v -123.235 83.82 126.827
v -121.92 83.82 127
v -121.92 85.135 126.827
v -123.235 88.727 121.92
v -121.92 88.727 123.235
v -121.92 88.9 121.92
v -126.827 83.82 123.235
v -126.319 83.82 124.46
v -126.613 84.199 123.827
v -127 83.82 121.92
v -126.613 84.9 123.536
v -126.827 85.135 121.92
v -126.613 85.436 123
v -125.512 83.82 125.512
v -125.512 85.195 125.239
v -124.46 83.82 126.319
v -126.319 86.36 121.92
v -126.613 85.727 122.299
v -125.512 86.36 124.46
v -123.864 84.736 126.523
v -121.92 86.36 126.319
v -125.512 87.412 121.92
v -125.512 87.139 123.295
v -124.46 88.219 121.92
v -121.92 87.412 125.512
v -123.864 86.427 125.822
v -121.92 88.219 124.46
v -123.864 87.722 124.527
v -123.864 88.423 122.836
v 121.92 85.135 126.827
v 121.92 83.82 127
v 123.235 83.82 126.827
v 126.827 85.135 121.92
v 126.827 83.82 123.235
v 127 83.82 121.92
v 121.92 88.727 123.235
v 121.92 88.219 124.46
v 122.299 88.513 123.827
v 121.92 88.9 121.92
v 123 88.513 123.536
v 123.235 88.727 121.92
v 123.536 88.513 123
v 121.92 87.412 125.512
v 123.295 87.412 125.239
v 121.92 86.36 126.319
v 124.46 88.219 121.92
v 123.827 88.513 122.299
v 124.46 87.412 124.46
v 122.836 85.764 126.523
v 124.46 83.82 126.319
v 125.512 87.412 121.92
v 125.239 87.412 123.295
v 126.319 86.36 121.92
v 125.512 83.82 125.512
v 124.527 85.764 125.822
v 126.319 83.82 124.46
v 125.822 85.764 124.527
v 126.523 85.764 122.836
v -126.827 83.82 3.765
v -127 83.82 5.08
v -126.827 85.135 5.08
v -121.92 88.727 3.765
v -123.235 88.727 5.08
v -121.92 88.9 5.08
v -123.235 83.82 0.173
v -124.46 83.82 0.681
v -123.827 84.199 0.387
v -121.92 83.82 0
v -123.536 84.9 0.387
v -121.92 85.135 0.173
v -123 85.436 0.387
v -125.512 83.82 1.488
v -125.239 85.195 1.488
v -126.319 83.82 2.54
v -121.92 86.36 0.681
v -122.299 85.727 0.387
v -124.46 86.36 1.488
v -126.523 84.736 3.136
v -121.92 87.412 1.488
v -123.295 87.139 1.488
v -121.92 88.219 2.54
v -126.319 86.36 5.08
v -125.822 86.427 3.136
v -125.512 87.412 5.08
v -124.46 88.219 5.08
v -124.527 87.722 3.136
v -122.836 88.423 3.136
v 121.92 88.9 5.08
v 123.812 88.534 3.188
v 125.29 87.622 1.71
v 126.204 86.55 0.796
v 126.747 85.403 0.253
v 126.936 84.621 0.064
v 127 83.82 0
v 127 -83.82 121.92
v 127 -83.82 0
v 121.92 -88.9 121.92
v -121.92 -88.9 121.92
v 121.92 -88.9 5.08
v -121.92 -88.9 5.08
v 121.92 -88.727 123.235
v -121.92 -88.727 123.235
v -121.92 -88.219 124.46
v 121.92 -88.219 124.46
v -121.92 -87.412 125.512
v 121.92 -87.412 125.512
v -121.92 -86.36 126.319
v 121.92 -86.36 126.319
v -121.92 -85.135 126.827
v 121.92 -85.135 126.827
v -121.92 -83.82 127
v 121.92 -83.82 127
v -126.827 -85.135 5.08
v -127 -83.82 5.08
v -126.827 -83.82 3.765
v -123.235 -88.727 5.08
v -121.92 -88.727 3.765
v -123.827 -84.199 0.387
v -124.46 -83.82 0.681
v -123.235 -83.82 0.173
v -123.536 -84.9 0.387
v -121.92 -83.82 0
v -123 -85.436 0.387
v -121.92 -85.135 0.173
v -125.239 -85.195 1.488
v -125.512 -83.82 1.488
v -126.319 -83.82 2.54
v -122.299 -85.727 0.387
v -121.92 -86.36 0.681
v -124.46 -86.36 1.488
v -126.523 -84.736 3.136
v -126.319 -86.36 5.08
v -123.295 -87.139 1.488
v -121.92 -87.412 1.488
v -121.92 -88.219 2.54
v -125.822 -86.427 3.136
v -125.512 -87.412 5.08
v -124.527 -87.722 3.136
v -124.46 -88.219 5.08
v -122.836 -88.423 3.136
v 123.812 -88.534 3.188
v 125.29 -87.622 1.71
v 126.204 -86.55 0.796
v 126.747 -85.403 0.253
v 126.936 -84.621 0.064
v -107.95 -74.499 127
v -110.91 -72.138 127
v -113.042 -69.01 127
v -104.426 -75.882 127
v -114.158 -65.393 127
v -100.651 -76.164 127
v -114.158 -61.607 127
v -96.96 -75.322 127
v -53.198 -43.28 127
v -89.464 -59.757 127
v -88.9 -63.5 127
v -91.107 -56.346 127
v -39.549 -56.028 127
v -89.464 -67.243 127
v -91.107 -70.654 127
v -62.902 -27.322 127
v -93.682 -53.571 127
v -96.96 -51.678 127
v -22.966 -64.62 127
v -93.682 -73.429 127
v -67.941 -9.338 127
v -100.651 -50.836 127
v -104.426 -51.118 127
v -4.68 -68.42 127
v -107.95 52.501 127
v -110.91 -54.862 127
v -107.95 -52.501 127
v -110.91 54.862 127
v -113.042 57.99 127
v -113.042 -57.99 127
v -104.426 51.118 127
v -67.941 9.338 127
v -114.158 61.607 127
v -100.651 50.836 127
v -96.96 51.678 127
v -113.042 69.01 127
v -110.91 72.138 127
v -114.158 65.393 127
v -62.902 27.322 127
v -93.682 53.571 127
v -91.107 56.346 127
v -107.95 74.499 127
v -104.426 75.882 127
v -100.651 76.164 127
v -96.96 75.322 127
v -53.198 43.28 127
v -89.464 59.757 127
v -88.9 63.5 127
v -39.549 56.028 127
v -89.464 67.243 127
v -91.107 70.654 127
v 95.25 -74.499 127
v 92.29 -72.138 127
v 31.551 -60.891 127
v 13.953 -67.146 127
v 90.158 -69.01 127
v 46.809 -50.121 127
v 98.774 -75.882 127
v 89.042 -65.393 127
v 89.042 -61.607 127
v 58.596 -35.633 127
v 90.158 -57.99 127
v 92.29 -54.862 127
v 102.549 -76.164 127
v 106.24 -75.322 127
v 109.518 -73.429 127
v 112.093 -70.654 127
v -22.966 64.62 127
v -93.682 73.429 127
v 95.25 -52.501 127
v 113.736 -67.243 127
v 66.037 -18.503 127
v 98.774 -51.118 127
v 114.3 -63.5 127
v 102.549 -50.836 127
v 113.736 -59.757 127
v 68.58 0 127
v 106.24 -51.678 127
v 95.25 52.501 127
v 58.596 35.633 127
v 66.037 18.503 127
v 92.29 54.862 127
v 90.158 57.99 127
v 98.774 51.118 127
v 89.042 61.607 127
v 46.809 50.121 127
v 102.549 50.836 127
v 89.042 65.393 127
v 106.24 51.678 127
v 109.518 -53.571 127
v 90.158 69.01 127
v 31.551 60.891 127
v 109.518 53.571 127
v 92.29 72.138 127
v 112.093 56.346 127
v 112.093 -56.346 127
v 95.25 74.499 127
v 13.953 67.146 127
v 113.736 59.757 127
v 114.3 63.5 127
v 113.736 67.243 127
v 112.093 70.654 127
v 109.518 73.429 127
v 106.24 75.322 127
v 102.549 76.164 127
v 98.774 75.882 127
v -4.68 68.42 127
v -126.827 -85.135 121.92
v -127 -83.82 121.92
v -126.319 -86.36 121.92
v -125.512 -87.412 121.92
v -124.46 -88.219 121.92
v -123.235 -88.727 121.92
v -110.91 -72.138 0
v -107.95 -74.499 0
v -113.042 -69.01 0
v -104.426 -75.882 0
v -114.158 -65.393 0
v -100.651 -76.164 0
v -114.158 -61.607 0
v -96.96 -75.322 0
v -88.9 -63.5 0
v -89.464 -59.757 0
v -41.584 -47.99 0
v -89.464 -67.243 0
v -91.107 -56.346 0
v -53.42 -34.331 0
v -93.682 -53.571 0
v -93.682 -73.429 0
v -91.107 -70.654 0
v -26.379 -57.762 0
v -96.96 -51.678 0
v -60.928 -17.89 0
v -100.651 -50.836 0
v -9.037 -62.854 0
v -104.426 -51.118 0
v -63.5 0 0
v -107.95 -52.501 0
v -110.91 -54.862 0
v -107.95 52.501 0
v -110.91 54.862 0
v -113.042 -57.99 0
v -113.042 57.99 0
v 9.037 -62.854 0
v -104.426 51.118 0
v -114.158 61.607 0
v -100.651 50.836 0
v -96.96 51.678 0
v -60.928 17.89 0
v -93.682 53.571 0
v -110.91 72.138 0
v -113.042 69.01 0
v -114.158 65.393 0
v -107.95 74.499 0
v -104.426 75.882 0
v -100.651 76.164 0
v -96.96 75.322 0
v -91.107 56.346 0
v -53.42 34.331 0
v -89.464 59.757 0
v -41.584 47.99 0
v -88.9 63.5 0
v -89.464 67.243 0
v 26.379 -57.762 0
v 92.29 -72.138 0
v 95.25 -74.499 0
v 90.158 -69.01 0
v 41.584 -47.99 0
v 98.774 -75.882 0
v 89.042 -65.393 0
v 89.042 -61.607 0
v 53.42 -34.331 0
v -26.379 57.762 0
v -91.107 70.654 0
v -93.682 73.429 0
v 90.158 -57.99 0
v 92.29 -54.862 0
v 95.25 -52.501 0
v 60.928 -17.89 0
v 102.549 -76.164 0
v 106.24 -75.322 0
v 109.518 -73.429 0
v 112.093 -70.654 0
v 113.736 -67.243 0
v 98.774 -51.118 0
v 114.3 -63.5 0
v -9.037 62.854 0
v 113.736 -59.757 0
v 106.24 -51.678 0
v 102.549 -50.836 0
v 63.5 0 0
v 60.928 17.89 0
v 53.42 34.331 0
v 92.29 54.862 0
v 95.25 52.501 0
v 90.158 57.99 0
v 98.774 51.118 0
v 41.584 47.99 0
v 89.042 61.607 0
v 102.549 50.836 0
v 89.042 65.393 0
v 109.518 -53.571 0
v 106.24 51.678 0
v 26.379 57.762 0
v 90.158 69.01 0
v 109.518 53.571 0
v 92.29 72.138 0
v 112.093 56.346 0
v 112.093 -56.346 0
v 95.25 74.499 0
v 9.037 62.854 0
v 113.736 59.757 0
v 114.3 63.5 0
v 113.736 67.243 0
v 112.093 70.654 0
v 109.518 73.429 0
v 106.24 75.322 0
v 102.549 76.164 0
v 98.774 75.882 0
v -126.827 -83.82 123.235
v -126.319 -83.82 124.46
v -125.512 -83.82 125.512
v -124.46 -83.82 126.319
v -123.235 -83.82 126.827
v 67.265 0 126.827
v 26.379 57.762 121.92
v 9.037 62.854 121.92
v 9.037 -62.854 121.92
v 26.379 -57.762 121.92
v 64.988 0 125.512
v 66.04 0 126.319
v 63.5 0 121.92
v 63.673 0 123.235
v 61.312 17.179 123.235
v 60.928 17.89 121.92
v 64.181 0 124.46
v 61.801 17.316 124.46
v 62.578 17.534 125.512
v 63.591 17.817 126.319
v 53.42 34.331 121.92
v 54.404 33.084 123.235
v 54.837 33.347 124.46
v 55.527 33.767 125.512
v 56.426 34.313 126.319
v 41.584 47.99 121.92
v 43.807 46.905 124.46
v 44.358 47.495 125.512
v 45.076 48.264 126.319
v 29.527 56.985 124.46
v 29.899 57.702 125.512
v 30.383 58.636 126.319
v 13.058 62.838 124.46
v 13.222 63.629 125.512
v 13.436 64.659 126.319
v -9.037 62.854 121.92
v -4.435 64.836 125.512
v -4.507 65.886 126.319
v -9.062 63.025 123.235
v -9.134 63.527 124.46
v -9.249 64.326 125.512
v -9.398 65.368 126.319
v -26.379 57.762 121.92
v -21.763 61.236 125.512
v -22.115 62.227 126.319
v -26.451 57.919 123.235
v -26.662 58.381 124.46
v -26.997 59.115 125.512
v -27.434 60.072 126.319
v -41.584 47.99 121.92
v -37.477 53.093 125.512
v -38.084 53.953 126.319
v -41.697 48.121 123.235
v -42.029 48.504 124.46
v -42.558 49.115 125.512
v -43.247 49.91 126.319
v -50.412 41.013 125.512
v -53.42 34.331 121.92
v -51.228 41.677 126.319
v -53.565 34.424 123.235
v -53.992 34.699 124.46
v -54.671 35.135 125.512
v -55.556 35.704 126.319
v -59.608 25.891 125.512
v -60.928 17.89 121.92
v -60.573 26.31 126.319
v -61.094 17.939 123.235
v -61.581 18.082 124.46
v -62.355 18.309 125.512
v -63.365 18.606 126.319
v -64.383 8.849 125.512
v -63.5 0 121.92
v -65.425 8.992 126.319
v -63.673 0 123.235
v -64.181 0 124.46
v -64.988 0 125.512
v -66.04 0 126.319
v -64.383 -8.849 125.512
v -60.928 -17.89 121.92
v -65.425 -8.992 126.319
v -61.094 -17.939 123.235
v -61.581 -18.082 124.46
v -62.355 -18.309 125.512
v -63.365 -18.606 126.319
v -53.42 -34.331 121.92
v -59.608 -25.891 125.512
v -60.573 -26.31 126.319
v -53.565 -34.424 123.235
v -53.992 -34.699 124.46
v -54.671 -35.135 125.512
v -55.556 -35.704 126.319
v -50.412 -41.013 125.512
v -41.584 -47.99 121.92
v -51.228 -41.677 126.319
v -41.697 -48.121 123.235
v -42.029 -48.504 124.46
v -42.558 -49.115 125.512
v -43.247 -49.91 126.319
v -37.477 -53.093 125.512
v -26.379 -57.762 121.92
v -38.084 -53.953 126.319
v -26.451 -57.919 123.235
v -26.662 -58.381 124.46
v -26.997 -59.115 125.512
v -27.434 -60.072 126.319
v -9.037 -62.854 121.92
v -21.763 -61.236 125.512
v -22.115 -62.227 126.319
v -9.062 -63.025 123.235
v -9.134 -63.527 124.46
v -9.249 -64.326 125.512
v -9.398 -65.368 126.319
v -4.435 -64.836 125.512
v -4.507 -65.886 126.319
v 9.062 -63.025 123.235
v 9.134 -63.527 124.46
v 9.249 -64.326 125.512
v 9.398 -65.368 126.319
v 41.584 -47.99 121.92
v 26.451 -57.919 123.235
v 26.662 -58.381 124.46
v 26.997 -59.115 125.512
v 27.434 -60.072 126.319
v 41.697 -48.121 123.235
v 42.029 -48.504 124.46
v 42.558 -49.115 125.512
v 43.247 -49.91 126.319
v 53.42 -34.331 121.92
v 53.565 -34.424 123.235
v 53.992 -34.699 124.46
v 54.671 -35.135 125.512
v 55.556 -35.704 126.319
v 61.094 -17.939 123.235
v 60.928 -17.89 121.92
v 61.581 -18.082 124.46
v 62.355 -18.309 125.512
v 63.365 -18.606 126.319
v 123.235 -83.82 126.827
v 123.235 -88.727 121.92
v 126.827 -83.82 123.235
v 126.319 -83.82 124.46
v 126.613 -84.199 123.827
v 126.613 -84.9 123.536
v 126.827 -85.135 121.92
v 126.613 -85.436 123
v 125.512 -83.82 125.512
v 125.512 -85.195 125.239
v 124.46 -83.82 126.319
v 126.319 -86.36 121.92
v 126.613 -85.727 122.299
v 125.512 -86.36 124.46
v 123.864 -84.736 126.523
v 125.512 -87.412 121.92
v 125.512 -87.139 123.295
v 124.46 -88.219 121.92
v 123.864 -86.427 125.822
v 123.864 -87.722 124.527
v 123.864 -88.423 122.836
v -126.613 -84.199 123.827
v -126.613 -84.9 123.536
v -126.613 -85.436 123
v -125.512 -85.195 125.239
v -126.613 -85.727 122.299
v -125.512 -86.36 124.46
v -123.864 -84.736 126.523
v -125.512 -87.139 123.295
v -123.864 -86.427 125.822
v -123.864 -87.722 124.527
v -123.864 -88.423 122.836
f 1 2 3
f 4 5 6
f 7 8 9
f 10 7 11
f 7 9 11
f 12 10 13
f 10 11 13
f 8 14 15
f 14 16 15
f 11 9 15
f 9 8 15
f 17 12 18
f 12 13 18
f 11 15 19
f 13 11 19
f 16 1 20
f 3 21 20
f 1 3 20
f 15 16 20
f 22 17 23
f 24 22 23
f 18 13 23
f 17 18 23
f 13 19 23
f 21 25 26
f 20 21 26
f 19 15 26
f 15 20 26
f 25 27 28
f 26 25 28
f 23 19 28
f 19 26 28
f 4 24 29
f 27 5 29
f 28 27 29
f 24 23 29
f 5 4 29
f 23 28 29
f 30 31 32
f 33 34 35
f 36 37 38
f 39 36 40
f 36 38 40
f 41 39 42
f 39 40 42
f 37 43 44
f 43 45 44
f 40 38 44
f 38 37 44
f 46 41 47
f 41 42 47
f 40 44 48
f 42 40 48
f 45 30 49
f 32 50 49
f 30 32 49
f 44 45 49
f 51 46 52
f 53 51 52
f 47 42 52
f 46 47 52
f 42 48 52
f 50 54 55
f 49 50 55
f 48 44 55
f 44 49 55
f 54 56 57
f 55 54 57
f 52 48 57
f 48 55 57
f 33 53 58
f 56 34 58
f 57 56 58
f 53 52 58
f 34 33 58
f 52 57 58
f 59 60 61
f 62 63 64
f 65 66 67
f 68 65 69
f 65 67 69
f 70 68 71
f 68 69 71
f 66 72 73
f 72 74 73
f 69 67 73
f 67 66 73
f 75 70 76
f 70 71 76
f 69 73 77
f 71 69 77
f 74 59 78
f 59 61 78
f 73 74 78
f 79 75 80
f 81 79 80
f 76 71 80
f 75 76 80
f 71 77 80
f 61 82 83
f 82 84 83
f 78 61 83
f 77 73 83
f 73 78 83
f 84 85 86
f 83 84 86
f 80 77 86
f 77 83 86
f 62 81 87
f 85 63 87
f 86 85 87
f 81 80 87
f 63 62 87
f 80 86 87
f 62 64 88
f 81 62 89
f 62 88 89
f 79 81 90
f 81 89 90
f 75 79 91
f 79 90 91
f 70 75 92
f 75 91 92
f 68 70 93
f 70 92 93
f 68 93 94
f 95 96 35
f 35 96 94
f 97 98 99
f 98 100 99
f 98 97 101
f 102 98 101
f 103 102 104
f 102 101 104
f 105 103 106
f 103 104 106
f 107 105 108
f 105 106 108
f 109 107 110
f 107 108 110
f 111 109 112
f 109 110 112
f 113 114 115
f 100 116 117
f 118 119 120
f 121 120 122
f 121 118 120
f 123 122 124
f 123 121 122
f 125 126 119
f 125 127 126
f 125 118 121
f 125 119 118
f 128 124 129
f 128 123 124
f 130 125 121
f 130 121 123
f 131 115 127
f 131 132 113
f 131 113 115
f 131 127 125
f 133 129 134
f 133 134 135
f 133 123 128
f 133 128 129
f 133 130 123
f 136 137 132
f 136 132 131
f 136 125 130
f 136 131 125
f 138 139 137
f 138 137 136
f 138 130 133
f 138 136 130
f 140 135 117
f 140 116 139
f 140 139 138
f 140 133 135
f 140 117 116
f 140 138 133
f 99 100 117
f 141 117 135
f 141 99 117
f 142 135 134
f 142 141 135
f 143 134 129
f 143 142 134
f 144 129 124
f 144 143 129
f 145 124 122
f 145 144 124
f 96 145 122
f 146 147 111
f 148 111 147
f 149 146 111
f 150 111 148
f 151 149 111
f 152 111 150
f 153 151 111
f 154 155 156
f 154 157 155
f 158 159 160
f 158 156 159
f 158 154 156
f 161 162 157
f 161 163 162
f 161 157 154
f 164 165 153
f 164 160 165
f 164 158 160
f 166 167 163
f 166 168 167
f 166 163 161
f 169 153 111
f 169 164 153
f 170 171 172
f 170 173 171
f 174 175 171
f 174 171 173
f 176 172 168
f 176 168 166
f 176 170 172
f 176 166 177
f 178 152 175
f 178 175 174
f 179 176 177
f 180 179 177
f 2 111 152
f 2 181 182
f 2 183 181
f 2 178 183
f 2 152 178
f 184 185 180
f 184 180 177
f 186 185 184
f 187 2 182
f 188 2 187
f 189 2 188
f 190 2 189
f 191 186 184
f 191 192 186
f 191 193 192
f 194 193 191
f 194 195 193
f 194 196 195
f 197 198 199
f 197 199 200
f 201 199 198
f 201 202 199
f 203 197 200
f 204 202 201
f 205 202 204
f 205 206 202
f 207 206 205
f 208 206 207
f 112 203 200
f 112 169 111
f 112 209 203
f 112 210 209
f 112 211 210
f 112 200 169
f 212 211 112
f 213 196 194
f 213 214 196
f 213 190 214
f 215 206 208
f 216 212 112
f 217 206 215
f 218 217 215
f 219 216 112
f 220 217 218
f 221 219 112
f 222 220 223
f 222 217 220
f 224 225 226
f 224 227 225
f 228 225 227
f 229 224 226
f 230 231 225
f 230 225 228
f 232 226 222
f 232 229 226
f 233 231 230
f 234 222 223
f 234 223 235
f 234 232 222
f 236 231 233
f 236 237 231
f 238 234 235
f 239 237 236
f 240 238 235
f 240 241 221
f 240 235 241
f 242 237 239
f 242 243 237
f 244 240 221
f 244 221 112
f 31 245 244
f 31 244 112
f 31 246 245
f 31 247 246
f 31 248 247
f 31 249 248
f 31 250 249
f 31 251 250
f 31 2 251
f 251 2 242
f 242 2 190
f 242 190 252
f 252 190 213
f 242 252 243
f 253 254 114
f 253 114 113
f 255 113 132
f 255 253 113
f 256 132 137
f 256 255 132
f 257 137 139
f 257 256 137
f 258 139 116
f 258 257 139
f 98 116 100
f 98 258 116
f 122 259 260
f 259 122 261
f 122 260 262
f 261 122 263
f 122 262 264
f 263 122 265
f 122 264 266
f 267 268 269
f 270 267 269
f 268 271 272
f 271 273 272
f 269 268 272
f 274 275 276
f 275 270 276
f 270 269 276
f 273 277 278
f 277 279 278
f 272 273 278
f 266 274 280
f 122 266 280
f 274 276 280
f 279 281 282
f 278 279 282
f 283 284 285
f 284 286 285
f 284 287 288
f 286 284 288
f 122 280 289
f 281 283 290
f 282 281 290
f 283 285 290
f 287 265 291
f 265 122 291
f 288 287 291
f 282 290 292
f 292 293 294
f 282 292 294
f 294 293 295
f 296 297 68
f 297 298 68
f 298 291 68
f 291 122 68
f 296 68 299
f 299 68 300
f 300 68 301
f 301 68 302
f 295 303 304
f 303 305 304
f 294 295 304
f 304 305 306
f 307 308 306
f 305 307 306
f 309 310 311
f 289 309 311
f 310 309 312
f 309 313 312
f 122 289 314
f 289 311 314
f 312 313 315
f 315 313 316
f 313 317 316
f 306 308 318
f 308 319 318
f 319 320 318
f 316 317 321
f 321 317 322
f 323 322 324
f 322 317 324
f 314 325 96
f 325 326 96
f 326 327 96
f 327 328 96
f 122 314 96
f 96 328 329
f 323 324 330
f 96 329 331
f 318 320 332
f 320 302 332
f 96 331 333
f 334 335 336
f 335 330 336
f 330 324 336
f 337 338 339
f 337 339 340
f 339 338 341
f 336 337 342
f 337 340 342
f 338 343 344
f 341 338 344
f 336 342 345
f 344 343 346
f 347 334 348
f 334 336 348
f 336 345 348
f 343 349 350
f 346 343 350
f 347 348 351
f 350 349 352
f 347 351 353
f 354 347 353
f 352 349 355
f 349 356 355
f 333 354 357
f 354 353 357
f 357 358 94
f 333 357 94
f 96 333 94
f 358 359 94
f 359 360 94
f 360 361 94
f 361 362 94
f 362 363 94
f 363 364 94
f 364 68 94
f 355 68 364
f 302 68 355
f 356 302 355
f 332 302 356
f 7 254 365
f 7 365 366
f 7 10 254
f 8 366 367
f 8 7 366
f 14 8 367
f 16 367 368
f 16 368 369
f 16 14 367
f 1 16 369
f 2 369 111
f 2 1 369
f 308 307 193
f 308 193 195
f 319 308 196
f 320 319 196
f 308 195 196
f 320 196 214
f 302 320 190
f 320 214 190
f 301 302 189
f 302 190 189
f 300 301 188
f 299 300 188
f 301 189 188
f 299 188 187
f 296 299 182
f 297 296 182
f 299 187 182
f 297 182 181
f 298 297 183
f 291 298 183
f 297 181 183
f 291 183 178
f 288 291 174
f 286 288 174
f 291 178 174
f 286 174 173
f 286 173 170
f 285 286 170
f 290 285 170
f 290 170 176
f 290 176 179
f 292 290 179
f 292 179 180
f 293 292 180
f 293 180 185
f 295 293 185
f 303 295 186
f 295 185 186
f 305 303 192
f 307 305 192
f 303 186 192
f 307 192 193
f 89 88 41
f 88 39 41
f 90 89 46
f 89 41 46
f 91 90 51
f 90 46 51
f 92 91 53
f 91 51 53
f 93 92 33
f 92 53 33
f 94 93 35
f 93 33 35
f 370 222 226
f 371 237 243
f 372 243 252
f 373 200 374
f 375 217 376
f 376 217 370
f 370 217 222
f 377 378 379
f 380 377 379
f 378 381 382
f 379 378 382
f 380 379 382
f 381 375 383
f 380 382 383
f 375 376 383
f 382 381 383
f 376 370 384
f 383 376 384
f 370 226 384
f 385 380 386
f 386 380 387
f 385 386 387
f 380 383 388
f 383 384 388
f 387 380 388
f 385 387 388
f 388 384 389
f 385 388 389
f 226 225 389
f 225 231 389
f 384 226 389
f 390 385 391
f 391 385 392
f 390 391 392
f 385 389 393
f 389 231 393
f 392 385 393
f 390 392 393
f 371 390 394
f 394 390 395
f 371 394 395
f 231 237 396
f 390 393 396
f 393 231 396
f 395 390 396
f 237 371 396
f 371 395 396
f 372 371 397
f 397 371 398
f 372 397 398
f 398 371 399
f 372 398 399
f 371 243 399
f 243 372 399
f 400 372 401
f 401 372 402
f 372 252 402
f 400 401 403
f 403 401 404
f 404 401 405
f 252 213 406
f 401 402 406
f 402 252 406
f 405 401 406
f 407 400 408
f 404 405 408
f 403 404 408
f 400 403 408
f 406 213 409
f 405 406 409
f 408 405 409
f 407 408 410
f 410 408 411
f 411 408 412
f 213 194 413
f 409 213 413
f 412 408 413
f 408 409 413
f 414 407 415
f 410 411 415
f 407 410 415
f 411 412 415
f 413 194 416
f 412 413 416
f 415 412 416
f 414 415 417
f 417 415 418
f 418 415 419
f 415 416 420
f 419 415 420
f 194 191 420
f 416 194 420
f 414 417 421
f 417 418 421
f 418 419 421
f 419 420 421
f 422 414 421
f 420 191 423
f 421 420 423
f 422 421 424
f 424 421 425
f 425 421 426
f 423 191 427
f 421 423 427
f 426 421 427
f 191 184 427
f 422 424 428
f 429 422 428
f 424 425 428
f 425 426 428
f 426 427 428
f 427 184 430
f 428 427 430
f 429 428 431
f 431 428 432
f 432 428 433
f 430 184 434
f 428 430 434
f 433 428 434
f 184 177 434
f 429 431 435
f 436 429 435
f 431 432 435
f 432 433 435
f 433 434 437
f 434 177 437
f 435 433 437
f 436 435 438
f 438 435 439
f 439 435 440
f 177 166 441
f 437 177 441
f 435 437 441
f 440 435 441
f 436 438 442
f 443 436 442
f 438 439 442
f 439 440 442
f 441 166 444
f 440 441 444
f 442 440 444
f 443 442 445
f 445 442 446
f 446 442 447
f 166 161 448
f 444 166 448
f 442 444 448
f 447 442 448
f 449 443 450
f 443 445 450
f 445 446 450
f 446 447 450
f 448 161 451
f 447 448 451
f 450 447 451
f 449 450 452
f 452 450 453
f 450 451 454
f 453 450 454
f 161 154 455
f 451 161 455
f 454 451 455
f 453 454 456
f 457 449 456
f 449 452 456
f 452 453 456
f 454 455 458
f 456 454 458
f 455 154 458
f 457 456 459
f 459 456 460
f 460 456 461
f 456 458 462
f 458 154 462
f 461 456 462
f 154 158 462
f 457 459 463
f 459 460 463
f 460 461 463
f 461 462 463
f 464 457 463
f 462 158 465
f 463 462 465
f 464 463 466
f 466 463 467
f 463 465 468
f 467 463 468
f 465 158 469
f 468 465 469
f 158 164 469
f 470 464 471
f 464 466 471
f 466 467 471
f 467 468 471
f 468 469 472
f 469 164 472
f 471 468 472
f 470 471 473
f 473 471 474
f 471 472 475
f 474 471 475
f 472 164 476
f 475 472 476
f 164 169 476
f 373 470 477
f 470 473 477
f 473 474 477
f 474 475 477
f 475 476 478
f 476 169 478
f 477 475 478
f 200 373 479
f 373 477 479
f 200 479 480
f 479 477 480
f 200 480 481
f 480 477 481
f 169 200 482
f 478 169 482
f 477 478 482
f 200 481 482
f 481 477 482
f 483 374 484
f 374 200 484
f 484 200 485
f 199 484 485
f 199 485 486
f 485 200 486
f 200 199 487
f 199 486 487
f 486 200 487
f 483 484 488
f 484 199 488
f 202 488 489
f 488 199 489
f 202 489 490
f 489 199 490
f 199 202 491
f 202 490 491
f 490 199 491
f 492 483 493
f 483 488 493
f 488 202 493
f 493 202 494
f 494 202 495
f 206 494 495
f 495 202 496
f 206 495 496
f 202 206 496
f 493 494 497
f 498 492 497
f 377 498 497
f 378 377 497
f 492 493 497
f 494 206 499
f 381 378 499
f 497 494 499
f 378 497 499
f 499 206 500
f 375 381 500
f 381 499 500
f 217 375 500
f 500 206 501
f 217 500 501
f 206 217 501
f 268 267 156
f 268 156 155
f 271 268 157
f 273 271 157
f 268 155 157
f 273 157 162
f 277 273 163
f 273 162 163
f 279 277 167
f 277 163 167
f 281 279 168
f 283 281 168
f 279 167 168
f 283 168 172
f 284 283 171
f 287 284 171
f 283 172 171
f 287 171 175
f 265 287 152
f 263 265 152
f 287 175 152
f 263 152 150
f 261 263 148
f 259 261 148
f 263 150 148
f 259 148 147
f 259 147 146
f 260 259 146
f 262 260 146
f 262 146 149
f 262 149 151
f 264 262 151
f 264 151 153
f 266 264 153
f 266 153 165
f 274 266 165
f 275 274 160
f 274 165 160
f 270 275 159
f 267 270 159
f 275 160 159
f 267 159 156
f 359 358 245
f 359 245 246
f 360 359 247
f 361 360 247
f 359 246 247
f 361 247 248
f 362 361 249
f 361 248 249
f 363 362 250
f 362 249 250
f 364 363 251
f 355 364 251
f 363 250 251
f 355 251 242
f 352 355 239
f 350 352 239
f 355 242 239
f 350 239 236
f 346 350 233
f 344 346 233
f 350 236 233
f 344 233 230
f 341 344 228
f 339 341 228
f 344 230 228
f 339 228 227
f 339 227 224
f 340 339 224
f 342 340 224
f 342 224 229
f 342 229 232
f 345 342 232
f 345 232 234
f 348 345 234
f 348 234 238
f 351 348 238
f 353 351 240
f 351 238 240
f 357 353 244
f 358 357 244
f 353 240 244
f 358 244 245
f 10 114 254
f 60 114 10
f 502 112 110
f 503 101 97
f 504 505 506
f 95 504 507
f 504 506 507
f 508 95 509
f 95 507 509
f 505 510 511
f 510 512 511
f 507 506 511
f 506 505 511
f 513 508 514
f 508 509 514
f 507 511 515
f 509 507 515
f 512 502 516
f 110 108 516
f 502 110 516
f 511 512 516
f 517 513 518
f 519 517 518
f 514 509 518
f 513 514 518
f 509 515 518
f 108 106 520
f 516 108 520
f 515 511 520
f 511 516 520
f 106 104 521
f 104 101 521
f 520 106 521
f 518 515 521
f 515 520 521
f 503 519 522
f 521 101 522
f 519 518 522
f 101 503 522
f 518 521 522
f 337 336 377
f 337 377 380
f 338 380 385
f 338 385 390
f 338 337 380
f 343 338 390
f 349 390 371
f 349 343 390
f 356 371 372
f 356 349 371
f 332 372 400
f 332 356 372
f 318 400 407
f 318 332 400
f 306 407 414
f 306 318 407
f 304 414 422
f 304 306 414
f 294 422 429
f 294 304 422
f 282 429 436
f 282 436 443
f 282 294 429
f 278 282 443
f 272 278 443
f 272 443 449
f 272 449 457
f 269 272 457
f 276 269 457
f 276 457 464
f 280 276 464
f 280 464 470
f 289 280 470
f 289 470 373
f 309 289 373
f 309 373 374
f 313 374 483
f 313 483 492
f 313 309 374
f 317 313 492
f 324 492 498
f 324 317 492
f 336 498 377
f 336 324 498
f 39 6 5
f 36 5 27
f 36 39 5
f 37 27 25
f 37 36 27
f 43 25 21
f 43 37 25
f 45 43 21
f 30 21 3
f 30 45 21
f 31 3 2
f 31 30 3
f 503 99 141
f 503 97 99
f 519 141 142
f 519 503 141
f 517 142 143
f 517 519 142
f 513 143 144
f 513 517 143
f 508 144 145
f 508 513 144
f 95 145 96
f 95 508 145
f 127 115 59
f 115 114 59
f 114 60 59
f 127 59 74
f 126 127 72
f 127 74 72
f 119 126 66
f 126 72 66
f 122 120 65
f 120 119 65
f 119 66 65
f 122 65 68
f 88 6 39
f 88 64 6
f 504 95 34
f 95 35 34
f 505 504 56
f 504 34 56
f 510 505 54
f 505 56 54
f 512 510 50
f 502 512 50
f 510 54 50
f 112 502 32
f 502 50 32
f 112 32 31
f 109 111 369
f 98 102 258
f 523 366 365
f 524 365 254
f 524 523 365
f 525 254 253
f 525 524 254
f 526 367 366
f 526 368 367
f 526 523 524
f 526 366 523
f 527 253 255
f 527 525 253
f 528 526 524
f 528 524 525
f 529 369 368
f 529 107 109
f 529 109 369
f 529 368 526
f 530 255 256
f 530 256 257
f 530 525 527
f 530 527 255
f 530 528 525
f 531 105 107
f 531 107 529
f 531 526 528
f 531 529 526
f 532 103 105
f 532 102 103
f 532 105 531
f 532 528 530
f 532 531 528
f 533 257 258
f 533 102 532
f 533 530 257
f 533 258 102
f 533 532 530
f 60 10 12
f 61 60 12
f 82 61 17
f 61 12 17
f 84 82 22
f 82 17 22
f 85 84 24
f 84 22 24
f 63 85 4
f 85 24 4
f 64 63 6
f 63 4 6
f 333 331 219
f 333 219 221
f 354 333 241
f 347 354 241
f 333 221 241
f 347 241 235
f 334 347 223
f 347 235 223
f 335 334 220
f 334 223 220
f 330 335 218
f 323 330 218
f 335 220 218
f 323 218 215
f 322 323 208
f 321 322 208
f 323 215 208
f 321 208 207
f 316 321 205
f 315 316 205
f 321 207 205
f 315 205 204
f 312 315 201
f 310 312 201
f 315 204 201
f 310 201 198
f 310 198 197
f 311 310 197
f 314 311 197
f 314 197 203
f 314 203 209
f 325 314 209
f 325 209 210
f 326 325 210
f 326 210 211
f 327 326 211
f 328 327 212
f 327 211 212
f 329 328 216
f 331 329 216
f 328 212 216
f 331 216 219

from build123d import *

# Parameters (mm, degrees)
F0_W     = 254
F0_H     = 177.8
F0_R     = 63.5
F1_DEPTH = 127
F2_R     = 5.08
F3_R     = 12.7
F4_DEPTH = 127


with BuildPart() as f1:
    # F0 (on Top) → F1 (new body)
    with BuildSketch(Plane.XY):
        Rectangle(F0_W, F0_H)
        Circle(F0_R, mode=Mode.SUBTRACT)
    extrude(amount=F1_DEPTH)

    # F2
    f2_edges = [f1.edges().sort_by_distance(p)[0] for p in [
        (0, -88.9, 127),
        (127, 0, 127),
        (0, 88.9, 127),
        (-127, 0, 127),
        (-63.5, 0, 127),
        (-127, 88.9, 63.5),
        (-127, -88.9, 63.5),
        (-127, 0, 0),
        (127, -88.9, 63.5),
        (0, -88.9, 0),
        (127, 88.9, 63.5),
        (0, 88.9, 0),
    ]]
    fillet(f2_edges, radius=F2_R)

    # F3 (on face) → F4 (cut, through all)
    with BuildSketch(Plane.XY.offset(127)):
        with Locations((-101.6, 63.5)):
            Circle(F3_R)
        with Locations((101.6, 63.5)):
            Circle(F3_R)
        with Locations((101.6, -63.5)):
            Circle(F3_R)
        with Locations((-101.6, -63.5)):
            Circle(F3_R)
    extrude(amount=-F4_DEPTH, mode=Mode.SUBTRACT)


solid = f1.part
